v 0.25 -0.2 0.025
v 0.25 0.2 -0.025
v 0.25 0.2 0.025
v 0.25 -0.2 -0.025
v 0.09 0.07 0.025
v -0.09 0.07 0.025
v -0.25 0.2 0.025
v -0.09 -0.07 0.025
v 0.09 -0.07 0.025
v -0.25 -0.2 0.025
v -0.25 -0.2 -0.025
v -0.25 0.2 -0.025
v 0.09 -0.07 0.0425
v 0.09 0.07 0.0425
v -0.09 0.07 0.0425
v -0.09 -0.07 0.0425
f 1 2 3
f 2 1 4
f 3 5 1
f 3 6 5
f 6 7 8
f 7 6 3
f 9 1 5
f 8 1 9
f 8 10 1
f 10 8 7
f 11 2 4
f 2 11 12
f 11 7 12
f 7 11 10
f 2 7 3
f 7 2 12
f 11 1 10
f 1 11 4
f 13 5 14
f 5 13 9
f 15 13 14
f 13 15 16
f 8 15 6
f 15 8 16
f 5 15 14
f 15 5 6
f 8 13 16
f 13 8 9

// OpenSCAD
$fn=64;

plate_len = 0.5;
plate_wid = 0.4;
plate_thk = 0.05;

boss_len = 0.18;
boss_wid = 0.14;
boss_thk = 0.03;

module plate(l,w,t){
    translate([-l/2, -w/2, -t/2])
        cube([l,w,t], center=false);
}

module boss(l,w,t,base_t){
    translate([-l/2, -w/2, base_t/2])
        cube([l,w,t], center=false);
}

union(){
    plate(plate_len, plate_wid, plate_thk);
    boss(boss_len, boss_wid, boss_thk, plate_thk/2);
}
